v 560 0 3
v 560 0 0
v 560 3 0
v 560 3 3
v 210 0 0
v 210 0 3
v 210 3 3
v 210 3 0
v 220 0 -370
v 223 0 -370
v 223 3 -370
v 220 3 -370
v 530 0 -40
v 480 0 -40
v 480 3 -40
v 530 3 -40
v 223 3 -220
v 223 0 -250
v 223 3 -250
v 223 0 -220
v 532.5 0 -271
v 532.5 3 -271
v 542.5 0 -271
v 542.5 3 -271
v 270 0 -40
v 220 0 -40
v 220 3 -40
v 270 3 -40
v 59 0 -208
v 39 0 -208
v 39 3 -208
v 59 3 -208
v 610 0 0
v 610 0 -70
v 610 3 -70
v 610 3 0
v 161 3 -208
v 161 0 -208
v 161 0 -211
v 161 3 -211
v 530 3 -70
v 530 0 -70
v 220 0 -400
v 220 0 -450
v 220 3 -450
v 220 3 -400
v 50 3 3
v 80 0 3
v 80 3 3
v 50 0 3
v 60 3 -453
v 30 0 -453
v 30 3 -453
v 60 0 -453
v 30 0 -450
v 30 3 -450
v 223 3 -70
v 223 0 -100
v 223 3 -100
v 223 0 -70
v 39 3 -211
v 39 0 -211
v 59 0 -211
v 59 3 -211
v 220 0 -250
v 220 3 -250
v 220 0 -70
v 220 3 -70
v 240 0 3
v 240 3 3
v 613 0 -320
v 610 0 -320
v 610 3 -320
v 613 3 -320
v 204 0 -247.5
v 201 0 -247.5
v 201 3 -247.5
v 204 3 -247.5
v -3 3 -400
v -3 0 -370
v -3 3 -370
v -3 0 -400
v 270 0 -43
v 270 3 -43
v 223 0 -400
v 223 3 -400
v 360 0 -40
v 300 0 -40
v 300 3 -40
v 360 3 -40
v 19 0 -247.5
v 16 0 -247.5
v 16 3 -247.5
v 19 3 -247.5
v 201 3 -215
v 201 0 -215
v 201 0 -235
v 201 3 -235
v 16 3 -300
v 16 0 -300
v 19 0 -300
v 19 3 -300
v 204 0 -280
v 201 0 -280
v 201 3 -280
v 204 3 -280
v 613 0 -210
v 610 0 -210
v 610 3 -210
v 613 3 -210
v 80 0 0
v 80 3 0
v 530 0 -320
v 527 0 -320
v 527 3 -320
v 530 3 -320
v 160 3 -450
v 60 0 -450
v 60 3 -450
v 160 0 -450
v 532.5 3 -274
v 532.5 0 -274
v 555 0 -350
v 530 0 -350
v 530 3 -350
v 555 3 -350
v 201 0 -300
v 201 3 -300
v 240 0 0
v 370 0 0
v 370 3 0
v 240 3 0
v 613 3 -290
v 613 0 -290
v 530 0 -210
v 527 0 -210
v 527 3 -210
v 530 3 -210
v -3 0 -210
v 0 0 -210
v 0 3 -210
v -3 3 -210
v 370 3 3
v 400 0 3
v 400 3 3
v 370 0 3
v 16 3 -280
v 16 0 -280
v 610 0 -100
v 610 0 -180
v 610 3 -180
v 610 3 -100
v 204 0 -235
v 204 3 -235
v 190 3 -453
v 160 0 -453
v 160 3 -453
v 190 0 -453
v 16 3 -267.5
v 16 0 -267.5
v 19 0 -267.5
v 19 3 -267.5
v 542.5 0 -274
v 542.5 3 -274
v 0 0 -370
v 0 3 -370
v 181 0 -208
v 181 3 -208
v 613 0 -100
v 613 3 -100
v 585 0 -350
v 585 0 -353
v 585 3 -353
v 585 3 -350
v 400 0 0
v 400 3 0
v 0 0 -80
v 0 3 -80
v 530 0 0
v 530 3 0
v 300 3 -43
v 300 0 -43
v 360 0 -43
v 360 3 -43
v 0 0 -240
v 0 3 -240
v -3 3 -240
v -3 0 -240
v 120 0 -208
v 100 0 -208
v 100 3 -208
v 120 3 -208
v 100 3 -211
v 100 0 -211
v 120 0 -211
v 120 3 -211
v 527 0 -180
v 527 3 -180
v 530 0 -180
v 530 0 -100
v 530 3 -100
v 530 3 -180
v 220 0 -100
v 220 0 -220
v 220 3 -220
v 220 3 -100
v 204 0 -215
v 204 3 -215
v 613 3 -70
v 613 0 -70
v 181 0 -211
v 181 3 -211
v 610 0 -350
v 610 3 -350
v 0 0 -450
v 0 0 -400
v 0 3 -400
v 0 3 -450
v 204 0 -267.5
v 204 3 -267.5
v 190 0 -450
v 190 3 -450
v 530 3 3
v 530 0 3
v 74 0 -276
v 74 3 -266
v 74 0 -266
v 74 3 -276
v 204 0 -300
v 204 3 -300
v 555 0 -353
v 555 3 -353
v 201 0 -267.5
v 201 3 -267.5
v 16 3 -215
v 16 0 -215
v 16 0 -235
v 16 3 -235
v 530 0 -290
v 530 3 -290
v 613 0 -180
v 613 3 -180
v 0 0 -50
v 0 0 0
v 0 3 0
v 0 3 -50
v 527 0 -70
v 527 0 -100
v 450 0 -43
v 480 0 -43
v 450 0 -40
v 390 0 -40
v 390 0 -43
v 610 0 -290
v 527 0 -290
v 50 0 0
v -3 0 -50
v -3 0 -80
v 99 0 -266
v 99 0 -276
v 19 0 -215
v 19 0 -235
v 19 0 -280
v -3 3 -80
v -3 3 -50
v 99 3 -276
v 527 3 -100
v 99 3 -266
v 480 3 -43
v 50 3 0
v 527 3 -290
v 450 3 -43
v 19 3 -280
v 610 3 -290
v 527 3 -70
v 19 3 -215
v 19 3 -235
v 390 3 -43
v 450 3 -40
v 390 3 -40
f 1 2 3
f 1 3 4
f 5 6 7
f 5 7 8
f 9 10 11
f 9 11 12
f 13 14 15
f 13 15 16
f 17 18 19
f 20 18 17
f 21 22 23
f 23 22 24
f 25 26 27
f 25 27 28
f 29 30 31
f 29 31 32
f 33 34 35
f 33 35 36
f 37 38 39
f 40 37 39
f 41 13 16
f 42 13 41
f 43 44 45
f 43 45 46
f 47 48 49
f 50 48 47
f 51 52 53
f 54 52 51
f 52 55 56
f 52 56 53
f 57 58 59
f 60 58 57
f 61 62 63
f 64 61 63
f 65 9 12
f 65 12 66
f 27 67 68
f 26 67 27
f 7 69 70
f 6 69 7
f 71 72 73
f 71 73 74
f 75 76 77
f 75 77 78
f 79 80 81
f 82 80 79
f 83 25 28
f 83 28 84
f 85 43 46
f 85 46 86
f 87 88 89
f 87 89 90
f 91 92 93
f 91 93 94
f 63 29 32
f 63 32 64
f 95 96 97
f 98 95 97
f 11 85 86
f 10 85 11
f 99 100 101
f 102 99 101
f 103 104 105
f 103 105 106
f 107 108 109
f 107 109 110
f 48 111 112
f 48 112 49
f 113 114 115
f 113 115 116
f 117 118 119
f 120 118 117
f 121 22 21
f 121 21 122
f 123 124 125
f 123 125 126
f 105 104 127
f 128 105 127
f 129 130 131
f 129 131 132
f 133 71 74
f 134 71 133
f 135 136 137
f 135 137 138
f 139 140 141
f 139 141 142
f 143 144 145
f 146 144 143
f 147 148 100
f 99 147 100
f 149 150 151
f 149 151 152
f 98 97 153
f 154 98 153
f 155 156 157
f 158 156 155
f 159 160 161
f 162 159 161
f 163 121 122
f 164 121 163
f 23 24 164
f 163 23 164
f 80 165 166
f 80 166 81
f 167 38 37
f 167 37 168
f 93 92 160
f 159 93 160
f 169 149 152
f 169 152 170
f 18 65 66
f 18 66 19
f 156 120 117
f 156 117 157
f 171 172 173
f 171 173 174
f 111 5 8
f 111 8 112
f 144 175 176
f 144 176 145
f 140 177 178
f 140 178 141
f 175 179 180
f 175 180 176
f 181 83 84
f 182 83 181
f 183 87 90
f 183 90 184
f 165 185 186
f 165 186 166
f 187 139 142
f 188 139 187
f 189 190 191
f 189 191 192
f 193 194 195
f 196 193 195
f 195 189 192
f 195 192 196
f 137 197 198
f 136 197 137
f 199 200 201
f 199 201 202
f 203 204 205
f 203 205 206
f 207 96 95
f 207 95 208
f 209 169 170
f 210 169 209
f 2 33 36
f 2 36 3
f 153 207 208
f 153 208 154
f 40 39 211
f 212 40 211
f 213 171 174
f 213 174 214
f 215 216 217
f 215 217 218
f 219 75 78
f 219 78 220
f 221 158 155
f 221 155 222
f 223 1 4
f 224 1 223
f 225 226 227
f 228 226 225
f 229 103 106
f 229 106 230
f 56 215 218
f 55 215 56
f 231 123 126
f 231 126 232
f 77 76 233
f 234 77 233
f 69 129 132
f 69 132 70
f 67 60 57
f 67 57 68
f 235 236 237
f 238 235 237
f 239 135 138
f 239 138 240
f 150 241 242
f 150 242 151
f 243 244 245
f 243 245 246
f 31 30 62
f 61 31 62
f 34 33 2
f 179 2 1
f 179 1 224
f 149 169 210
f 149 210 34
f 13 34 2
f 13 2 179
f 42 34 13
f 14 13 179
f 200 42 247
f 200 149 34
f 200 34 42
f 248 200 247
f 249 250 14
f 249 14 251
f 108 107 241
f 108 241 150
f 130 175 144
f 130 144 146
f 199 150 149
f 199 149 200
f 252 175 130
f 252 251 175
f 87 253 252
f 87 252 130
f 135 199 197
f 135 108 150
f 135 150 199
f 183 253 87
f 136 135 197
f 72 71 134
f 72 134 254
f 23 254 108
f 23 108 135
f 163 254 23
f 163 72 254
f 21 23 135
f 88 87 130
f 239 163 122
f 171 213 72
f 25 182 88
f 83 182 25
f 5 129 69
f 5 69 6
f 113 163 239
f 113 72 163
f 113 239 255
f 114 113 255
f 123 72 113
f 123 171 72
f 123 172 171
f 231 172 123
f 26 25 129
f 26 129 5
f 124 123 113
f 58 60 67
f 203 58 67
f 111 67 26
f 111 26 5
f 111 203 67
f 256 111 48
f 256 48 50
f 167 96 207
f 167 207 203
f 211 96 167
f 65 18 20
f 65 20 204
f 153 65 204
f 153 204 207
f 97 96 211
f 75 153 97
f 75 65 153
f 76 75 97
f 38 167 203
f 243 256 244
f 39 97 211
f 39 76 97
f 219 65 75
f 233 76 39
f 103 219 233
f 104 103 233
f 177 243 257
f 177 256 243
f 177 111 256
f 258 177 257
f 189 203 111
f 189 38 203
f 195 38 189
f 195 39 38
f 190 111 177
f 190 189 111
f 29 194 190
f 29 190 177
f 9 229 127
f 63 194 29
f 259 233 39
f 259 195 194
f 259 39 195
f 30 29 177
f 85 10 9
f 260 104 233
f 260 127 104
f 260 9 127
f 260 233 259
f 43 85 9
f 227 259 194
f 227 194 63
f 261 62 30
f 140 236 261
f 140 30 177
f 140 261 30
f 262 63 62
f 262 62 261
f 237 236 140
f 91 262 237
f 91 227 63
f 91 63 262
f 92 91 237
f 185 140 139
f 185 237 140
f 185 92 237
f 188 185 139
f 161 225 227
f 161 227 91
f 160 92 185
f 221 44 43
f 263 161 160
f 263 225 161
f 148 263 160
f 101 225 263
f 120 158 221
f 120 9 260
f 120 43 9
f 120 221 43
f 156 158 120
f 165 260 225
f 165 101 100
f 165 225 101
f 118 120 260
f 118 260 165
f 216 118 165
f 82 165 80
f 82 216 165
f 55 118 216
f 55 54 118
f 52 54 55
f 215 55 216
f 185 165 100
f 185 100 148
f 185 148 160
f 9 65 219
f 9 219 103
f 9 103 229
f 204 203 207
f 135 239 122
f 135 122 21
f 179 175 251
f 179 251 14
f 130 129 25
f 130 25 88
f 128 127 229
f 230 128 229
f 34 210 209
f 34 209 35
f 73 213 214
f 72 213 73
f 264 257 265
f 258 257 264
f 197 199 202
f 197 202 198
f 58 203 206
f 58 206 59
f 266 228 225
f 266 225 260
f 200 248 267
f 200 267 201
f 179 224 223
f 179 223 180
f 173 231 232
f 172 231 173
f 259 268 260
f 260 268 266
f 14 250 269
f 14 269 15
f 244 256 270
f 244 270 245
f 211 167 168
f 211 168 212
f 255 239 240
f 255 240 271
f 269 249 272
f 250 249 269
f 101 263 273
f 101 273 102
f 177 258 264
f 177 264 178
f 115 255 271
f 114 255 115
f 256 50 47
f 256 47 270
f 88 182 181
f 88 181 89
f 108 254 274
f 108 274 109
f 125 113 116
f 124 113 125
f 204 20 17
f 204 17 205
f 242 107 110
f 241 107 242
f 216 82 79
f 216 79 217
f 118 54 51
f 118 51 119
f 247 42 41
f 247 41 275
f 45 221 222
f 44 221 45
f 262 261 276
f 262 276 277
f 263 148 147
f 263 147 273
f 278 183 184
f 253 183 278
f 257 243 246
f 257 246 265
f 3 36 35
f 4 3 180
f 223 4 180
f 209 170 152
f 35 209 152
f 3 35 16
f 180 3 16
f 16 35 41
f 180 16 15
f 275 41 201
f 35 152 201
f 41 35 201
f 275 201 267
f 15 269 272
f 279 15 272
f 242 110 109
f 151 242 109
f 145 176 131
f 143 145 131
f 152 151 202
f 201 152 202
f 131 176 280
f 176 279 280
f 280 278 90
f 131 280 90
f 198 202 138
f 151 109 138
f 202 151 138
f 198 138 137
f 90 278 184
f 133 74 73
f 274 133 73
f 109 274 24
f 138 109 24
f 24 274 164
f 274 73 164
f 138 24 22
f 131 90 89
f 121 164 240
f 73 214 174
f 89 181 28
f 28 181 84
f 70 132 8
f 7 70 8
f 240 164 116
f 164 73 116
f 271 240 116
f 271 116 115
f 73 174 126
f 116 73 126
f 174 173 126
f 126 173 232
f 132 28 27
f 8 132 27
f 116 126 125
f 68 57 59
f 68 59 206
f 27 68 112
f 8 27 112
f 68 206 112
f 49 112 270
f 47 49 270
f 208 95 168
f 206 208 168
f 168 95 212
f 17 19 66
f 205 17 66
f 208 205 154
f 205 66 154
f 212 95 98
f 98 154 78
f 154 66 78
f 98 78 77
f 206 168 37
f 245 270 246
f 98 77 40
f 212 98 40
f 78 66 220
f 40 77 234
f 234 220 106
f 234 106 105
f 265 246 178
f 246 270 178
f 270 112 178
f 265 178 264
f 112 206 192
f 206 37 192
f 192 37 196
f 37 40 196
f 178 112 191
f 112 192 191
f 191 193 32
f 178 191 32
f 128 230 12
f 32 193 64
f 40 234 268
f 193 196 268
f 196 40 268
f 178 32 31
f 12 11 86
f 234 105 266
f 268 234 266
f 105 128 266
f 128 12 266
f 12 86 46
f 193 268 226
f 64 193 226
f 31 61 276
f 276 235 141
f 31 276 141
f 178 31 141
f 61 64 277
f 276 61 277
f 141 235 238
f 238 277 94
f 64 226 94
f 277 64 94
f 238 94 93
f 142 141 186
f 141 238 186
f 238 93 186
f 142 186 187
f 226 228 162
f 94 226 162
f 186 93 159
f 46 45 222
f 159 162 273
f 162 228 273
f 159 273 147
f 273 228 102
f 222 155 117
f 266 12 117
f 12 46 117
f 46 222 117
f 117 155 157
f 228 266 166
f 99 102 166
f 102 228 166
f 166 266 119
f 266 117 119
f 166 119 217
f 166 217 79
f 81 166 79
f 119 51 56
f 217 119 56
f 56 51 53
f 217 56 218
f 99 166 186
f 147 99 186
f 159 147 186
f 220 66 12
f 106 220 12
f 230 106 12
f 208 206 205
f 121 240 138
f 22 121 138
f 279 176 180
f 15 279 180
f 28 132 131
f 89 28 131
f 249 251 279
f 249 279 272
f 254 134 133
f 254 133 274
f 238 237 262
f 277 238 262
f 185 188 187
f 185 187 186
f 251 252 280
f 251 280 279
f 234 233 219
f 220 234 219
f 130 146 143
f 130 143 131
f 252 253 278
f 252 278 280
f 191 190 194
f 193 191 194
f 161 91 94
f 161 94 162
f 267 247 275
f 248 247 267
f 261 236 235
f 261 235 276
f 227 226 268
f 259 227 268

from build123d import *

# Parameters (mm, degrees)
SKETCH1_W           = 20
SKETCH1_H           = 3
SKETCH1_W_2         = 3
SKETCH1_H_2         = 20
BOSS_EXTRUDE1_DEPTH = 3
SKETCH2_W           = 10
SKETCH2_H           = 3
SKETCH2_W_2         = 25
SKETCH2_H_2         = 10
CUT_EXTRUDE1_DEPTH  = 10


with BuildPart() as part:
    # Sketch1 → Boss-Extrude1 (new body)
    with BuildSketch(Plane(origin=(0, 0, 0), x_dir=(1, 0, 0), z_dir=(0, 1, 0))):
        Polygon((0, 50), (0, 0), (50, 0), (50, -3), (80, -3), (80, 0), (210, 0), (210, -3), (240, -3), (240, 0), (370, 0), (370, -3), (400, -3), (400, 0), (530, 0), (530, -3), (560, -3), (560, 0), (610, 0), (610, 70), (613, 70), (613, 100), (610, 100), (610, 180), (613, 180), (613, 210), (610, 210), (610, 290), (613, 290), (613, 320), (610, 320), (610, 350), (585, 350), (585, 353), (555, 353), (555, 350), (530, 350), (530, 320), (527, 320), (527, 290), (530, 290), (530, 210), (527, 210), (527, 180), (530, 180), (530, 100), (527, 100), (527, 70), (530, 70), (530, 40), (480, 40), (480, 43), (450, 43), (450, 40), (390, 40), (390, 43), (360, 43), (360, 40), (300, 40), (300, 43), (270, 43), (270, 40), (220, 40), (220, 70), (223, 70), (223, 100), (220, 100), (220, 220), (223, 220), (223, 250), (220, 250), (220, 370), (223, 370), (223, 400), (220, 400), (220, 450), (190, 450), (190, 453), (160, 453), (160, 450), (60, 450), (60, 453), (30, 453), (30, 450), (0, 450), (0, 400), (-3, 400), (-3, 370), (0, 370), (0, 240), (-3, 240), (-3, 210), (0, 210), (0, 80), (-3, 80), (-3, 50), align=None)
        with Locations((49, 209.5)):
            Rectangle(SKETCH1_W, SKETCH1_H, mode=Mode.SUBTRACT)
        with Locations((110, 209.5)):
            Rectangle(SKETCH1_W, SKETCH1_H, mode=Mode.SUBTRACT)
        with Locations((171, 209.5)):
            Rectangle(SKETCH1_W, SKETCH1_H, mode=Mode.SUBTRACT)
        with Locations((17.5, 225)):
            Rectangle(SKETCH1_W_2, SKETCH1_H_2, mode=Mode.SUBTRACT)
        with Locations((17.5, 257.5)):
            Rectangle(SKETCH1_W_2, SKETCH1_H_2, mode=Mode.SUBTRACT)
        with Locations((17.5, 290)):
            Rectangle(SKETCH1_W_2, SKETCH1_H_2, mode=Mode.SUBTRACT)
        with Locations((202.5, 225)):
            Rectangle(SKETCH1_W_2, SKETCH1_H_2, mode=Mode.SUBTRACT)
        with Locations((202.5, 257.5)):
            Rectangle(SKETCH1_W_2, SKETCH1_H_2, mode=Mode.SUBTRACT)
        with Locations((202.5, 290)):
            Rectangle(SKETCH1_W_2, SKETCH1_H_2, mode=Mode.SUBTRACT)
    extrude(amount=BOSS_EXTRUDE1_DEPTH)

    # Sketch2 → Cut-Extrude1 (cut)
    with BuildSketch(Plane(origin=(0, 3, 0), x_dir=(1, 0, 0), z_dir=(0, 1, 0))):
        with Locations((537.5, 272.5)):
            Rectangle(SKETCH2_W, SKETCH2_H)
        with Locations((86.5, 271)):
            Rectangle(SKETCH2_W_2, SKETCH2_H_2)
    extrude(amount=-CUT_EXTRUDE1_DEPTH, mode=Mode.SUBTRACT)


solid = part.part
